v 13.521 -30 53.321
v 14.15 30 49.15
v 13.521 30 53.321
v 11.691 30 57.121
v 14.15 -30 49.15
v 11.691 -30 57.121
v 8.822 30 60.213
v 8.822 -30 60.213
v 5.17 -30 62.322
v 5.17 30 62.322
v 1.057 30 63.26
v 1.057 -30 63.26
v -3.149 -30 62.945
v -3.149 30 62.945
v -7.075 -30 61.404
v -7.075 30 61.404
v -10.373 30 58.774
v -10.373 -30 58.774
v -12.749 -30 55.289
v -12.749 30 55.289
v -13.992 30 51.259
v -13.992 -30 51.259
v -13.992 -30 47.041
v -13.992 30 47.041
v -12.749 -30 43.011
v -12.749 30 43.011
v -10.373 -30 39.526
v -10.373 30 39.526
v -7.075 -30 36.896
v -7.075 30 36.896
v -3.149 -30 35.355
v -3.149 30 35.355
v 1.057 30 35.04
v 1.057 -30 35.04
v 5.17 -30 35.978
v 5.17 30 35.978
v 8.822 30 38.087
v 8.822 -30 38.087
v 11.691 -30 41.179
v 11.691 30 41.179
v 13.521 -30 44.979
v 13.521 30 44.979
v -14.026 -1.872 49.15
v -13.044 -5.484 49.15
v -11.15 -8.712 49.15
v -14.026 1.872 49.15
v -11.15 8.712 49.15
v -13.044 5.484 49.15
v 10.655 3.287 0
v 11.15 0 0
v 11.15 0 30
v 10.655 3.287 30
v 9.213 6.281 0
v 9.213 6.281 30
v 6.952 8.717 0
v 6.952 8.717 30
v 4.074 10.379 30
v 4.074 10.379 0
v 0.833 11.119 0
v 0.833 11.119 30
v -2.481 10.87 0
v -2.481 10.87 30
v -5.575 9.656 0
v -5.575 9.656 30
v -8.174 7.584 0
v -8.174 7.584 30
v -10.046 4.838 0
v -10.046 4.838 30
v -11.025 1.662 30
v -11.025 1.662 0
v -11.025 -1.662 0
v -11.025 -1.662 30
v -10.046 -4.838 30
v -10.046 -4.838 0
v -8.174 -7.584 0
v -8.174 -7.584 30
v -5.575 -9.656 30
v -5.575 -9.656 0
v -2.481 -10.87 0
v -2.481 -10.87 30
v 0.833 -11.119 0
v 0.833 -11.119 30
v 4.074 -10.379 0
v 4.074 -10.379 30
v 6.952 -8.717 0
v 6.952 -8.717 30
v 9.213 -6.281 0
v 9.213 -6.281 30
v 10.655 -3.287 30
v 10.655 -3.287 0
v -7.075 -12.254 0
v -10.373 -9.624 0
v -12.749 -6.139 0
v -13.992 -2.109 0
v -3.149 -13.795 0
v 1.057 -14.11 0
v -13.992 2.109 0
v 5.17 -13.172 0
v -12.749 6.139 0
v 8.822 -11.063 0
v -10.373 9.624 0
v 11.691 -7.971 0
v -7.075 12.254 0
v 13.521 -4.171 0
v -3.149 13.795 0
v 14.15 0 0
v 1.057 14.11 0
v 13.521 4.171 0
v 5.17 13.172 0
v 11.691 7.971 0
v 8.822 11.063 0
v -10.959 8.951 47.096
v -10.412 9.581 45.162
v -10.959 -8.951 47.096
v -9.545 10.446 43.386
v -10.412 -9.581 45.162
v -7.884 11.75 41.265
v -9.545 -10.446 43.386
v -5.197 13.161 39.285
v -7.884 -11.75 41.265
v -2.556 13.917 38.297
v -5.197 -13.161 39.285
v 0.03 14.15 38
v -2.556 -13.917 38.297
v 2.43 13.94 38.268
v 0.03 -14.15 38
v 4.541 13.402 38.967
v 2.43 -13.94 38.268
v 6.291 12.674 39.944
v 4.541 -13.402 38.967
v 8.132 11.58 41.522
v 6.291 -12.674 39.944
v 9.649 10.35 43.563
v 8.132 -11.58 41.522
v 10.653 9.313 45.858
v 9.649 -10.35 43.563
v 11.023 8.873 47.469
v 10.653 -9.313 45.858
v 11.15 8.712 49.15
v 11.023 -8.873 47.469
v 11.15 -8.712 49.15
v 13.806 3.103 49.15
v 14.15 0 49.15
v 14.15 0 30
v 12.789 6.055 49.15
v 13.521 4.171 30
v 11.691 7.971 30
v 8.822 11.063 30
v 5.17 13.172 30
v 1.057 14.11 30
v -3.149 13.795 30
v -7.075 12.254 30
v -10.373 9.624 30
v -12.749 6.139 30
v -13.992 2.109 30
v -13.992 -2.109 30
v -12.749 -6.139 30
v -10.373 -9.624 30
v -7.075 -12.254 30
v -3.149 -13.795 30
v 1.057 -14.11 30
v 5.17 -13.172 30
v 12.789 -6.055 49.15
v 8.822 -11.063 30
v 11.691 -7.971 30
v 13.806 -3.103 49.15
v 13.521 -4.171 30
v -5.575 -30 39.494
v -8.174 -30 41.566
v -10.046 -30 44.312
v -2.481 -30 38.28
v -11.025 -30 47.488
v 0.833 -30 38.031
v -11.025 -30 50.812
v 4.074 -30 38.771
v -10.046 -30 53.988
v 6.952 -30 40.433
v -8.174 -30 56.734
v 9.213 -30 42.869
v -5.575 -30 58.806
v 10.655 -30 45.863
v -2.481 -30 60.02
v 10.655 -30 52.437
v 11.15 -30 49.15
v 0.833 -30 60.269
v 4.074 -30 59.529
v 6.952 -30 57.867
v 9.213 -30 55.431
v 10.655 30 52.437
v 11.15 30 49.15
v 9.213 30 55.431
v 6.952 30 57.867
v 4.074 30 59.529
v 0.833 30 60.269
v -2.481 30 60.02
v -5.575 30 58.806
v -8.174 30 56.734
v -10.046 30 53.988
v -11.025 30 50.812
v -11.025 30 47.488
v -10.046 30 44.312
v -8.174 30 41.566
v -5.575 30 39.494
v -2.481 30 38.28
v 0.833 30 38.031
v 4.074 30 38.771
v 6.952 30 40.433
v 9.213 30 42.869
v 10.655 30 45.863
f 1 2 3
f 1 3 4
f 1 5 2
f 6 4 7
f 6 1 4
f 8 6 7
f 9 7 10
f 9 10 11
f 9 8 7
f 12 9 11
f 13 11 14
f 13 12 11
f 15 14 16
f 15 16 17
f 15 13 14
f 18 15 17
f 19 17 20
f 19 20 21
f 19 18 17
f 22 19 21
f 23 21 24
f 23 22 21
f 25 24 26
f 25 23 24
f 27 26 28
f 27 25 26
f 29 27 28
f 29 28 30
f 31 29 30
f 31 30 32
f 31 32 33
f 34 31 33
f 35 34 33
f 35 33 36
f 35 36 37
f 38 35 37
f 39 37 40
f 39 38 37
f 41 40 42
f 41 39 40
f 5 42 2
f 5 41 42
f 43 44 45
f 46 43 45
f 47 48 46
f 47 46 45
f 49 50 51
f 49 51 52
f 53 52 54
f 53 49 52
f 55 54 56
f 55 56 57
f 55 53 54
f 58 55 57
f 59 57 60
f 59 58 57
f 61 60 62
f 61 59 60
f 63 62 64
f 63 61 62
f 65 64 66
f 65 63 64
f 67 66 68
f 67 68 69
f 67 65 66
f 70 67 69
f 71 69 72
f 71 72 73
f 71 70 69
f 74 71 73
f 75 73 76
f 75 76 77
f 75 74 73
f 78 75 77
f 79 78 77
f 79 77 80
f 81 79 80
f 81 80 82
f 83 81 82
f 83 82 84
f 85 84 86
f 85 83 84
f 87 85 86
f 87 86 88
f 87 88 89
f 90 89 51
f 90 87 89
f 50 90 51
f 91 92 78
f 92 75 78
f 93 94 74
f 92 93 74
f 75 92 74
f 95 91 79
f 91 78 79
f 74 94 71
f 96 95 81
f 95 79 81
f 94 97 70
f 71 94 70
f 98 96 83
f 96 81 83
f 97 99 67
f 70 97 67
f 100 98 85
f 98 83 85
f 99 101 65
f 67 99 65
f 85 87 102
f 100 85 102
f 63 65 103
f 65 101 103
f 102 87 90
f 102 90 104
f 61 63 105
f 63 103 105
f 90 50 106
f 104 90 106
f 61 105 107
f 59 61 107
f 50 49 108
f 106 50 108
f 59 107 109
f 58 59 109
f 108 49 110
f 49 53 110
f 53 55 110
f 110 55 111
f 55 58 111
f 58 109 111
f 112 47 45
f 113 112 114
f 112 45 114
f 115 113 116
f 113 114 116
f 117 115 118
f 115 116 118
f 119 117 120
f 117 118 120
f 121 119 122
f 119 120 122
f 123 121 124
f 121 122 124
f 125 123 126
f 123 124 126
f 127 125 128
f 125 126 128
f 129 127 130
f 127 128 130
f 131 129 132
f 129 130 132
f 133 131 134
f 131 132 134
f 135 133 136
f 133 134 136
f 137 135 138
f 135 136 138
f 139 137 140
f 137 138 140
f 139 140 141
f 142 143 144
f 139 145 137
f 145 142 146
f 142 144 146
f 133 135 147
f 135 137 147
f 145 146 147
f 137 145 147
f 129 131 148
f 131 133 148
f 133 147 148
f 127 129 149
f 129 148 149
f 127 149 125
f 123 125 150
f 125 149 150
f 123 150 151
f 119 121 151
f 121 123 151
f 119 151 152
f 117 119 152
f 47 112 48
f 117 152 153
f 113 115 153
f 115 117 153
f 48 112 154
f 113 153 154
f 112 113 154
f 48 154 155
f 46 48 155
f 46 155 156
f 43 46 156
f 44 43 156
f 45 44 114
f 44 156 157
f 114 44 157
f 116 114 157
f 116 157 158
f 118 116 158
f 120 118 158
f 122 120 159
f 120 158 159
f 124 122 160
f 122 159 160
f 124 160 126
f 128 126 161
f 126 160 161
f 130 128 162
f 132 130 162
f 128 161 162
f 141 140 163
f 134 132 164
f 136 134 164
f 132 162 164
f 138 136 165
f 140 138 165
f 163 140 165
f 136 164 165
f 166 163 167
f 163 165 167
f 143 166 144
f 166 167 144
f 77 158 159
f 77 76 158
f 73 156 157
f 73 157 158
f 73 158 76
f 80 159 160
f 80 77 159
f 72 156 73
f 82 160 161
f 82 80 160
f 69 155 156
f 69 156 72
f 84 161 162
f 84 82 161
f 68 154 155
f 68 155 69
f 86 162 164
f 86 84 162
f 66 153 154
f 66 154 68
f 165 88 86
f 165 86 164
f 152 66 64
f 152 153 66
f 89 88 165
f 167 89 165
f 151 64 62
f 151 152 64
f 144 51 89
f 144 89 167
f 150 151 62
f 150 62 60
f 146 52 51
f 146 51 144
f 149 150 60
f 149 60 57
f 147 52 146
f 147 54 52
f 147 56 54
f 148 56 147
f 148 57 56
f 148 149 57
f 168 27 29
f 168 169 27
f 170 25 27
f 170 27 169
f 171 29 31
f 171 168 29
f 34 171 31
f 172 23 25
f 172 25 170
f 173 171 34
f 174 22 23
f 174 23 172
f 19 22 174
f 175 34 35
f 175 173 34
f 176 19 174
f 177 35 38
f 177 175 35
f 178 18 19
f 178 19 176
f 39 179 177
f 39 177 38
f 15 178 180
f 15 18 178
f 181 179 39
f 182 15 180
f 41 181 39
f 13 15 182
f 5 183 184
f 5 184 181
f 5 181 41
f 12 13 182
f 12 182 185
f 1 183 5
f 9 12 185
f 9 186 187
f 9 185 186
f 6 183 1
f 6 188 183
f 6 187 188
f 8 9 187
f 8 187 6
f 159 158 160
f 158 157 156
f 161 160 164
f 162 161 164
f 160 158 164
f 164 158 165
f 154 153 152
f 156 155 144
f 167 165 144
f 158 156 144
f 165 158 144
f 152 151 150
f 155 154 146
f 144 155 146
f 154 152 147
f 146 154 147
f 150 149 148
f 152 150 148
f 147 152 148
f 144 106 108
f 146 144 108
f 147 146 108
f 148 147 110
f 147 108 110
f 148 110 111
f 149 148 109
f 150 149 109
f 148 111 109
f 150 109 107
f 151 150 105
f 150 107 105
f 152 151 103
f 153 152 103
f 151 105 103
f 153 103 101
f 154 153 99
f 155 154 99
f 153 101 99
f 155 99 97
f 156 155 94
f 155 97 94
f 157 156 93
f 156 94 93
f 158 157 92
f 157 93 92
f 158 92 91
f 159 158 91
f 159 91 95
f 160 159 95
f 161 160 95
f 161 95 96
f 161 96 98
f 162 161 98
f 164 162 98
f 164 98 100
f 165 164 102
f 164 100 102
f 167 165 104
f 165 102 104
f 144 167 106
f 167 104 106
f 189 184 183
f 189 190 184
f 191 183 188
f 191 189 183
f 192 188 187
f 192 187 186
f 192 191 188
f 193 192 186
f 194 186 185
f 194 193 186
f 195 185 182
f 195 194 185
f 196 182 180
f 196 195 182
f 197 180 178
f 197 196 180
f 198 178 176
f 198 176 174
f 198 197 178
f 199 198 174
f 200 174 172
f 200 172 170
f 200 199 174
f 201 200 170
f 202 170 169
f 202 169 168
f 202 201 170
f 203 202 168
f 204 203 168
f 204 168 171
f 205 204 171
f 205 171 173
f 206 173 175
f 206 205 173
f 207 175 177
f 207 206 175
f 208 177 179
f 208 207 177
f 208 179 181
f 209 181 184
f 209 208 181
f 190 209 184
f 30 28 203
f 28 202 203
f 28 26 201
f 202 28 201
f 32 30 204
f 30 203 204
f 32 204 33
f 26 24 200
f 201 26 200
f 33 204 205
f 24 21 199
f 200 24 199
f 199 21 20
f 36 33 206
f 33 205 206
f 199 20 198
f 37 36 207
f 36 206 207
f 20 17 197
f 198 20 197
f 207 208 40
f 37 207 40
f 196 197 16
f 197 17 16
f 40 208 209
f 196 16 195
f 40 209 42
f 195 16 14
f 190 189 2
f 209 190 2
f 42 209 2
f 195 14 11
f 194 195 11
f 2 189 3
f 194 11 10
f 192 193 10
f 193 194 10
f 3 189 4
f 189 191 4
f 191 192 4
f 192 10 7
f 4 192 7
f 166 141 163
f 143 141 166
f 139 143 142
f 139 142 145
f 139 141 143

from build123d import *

# Parameters (mm, degrees)
F0_R     = 14.15
F0_R_2   = 11.15
F1_DEPTH = 30
F2_R     = 14.15
F2_R_2   = 11.15
F3_DEPTH = 30
F4_R     = 14.15
F5_DEPTH = 19.15
F6_R     = 11.15
F7_DEPTH = 60


with BuildPart() as f1:
    # F0 (on Top) → F1 (new body)
    with BuildSketch(Plane.XY):
        Circle(F0_R)
        Circle(F0_R_2, mode=Mode.SUBTRACT)
    extrude(amount=F1_DEPTH)


with BuildPart() as f3:
    # F2 (on Front) → F3 (new body, symmetric)
    with BuildSketch(Plane.XZ):
        with Locations((0, 49.15)):
            Circle(F2_R)
        with Locations((0, 49.15)):
            Circle(F2_R_2, mode=Mode.SUBTRACT)
    extrude(amount=F3_DEPTH, both=True)


with BuildPart() as f5:
    # F4 (on face) → F5 (new body)
    with BuildSketch(Plane.XY.offset(30)):
        Circle(F4_R)
    extrude(amount=F5_DEPTH)

    # F6 (on face) → F7 (cut)
    with BuildSketch(Plane.XZ.offset(30)):
        with Locations((0, 49.15)):
            Circle(F6_R)
    extrude(amount=-F7_DEPTH, mode=Mode.SUBTRACT)


solid = Compound([f1.part, f3.part, f5.part])
